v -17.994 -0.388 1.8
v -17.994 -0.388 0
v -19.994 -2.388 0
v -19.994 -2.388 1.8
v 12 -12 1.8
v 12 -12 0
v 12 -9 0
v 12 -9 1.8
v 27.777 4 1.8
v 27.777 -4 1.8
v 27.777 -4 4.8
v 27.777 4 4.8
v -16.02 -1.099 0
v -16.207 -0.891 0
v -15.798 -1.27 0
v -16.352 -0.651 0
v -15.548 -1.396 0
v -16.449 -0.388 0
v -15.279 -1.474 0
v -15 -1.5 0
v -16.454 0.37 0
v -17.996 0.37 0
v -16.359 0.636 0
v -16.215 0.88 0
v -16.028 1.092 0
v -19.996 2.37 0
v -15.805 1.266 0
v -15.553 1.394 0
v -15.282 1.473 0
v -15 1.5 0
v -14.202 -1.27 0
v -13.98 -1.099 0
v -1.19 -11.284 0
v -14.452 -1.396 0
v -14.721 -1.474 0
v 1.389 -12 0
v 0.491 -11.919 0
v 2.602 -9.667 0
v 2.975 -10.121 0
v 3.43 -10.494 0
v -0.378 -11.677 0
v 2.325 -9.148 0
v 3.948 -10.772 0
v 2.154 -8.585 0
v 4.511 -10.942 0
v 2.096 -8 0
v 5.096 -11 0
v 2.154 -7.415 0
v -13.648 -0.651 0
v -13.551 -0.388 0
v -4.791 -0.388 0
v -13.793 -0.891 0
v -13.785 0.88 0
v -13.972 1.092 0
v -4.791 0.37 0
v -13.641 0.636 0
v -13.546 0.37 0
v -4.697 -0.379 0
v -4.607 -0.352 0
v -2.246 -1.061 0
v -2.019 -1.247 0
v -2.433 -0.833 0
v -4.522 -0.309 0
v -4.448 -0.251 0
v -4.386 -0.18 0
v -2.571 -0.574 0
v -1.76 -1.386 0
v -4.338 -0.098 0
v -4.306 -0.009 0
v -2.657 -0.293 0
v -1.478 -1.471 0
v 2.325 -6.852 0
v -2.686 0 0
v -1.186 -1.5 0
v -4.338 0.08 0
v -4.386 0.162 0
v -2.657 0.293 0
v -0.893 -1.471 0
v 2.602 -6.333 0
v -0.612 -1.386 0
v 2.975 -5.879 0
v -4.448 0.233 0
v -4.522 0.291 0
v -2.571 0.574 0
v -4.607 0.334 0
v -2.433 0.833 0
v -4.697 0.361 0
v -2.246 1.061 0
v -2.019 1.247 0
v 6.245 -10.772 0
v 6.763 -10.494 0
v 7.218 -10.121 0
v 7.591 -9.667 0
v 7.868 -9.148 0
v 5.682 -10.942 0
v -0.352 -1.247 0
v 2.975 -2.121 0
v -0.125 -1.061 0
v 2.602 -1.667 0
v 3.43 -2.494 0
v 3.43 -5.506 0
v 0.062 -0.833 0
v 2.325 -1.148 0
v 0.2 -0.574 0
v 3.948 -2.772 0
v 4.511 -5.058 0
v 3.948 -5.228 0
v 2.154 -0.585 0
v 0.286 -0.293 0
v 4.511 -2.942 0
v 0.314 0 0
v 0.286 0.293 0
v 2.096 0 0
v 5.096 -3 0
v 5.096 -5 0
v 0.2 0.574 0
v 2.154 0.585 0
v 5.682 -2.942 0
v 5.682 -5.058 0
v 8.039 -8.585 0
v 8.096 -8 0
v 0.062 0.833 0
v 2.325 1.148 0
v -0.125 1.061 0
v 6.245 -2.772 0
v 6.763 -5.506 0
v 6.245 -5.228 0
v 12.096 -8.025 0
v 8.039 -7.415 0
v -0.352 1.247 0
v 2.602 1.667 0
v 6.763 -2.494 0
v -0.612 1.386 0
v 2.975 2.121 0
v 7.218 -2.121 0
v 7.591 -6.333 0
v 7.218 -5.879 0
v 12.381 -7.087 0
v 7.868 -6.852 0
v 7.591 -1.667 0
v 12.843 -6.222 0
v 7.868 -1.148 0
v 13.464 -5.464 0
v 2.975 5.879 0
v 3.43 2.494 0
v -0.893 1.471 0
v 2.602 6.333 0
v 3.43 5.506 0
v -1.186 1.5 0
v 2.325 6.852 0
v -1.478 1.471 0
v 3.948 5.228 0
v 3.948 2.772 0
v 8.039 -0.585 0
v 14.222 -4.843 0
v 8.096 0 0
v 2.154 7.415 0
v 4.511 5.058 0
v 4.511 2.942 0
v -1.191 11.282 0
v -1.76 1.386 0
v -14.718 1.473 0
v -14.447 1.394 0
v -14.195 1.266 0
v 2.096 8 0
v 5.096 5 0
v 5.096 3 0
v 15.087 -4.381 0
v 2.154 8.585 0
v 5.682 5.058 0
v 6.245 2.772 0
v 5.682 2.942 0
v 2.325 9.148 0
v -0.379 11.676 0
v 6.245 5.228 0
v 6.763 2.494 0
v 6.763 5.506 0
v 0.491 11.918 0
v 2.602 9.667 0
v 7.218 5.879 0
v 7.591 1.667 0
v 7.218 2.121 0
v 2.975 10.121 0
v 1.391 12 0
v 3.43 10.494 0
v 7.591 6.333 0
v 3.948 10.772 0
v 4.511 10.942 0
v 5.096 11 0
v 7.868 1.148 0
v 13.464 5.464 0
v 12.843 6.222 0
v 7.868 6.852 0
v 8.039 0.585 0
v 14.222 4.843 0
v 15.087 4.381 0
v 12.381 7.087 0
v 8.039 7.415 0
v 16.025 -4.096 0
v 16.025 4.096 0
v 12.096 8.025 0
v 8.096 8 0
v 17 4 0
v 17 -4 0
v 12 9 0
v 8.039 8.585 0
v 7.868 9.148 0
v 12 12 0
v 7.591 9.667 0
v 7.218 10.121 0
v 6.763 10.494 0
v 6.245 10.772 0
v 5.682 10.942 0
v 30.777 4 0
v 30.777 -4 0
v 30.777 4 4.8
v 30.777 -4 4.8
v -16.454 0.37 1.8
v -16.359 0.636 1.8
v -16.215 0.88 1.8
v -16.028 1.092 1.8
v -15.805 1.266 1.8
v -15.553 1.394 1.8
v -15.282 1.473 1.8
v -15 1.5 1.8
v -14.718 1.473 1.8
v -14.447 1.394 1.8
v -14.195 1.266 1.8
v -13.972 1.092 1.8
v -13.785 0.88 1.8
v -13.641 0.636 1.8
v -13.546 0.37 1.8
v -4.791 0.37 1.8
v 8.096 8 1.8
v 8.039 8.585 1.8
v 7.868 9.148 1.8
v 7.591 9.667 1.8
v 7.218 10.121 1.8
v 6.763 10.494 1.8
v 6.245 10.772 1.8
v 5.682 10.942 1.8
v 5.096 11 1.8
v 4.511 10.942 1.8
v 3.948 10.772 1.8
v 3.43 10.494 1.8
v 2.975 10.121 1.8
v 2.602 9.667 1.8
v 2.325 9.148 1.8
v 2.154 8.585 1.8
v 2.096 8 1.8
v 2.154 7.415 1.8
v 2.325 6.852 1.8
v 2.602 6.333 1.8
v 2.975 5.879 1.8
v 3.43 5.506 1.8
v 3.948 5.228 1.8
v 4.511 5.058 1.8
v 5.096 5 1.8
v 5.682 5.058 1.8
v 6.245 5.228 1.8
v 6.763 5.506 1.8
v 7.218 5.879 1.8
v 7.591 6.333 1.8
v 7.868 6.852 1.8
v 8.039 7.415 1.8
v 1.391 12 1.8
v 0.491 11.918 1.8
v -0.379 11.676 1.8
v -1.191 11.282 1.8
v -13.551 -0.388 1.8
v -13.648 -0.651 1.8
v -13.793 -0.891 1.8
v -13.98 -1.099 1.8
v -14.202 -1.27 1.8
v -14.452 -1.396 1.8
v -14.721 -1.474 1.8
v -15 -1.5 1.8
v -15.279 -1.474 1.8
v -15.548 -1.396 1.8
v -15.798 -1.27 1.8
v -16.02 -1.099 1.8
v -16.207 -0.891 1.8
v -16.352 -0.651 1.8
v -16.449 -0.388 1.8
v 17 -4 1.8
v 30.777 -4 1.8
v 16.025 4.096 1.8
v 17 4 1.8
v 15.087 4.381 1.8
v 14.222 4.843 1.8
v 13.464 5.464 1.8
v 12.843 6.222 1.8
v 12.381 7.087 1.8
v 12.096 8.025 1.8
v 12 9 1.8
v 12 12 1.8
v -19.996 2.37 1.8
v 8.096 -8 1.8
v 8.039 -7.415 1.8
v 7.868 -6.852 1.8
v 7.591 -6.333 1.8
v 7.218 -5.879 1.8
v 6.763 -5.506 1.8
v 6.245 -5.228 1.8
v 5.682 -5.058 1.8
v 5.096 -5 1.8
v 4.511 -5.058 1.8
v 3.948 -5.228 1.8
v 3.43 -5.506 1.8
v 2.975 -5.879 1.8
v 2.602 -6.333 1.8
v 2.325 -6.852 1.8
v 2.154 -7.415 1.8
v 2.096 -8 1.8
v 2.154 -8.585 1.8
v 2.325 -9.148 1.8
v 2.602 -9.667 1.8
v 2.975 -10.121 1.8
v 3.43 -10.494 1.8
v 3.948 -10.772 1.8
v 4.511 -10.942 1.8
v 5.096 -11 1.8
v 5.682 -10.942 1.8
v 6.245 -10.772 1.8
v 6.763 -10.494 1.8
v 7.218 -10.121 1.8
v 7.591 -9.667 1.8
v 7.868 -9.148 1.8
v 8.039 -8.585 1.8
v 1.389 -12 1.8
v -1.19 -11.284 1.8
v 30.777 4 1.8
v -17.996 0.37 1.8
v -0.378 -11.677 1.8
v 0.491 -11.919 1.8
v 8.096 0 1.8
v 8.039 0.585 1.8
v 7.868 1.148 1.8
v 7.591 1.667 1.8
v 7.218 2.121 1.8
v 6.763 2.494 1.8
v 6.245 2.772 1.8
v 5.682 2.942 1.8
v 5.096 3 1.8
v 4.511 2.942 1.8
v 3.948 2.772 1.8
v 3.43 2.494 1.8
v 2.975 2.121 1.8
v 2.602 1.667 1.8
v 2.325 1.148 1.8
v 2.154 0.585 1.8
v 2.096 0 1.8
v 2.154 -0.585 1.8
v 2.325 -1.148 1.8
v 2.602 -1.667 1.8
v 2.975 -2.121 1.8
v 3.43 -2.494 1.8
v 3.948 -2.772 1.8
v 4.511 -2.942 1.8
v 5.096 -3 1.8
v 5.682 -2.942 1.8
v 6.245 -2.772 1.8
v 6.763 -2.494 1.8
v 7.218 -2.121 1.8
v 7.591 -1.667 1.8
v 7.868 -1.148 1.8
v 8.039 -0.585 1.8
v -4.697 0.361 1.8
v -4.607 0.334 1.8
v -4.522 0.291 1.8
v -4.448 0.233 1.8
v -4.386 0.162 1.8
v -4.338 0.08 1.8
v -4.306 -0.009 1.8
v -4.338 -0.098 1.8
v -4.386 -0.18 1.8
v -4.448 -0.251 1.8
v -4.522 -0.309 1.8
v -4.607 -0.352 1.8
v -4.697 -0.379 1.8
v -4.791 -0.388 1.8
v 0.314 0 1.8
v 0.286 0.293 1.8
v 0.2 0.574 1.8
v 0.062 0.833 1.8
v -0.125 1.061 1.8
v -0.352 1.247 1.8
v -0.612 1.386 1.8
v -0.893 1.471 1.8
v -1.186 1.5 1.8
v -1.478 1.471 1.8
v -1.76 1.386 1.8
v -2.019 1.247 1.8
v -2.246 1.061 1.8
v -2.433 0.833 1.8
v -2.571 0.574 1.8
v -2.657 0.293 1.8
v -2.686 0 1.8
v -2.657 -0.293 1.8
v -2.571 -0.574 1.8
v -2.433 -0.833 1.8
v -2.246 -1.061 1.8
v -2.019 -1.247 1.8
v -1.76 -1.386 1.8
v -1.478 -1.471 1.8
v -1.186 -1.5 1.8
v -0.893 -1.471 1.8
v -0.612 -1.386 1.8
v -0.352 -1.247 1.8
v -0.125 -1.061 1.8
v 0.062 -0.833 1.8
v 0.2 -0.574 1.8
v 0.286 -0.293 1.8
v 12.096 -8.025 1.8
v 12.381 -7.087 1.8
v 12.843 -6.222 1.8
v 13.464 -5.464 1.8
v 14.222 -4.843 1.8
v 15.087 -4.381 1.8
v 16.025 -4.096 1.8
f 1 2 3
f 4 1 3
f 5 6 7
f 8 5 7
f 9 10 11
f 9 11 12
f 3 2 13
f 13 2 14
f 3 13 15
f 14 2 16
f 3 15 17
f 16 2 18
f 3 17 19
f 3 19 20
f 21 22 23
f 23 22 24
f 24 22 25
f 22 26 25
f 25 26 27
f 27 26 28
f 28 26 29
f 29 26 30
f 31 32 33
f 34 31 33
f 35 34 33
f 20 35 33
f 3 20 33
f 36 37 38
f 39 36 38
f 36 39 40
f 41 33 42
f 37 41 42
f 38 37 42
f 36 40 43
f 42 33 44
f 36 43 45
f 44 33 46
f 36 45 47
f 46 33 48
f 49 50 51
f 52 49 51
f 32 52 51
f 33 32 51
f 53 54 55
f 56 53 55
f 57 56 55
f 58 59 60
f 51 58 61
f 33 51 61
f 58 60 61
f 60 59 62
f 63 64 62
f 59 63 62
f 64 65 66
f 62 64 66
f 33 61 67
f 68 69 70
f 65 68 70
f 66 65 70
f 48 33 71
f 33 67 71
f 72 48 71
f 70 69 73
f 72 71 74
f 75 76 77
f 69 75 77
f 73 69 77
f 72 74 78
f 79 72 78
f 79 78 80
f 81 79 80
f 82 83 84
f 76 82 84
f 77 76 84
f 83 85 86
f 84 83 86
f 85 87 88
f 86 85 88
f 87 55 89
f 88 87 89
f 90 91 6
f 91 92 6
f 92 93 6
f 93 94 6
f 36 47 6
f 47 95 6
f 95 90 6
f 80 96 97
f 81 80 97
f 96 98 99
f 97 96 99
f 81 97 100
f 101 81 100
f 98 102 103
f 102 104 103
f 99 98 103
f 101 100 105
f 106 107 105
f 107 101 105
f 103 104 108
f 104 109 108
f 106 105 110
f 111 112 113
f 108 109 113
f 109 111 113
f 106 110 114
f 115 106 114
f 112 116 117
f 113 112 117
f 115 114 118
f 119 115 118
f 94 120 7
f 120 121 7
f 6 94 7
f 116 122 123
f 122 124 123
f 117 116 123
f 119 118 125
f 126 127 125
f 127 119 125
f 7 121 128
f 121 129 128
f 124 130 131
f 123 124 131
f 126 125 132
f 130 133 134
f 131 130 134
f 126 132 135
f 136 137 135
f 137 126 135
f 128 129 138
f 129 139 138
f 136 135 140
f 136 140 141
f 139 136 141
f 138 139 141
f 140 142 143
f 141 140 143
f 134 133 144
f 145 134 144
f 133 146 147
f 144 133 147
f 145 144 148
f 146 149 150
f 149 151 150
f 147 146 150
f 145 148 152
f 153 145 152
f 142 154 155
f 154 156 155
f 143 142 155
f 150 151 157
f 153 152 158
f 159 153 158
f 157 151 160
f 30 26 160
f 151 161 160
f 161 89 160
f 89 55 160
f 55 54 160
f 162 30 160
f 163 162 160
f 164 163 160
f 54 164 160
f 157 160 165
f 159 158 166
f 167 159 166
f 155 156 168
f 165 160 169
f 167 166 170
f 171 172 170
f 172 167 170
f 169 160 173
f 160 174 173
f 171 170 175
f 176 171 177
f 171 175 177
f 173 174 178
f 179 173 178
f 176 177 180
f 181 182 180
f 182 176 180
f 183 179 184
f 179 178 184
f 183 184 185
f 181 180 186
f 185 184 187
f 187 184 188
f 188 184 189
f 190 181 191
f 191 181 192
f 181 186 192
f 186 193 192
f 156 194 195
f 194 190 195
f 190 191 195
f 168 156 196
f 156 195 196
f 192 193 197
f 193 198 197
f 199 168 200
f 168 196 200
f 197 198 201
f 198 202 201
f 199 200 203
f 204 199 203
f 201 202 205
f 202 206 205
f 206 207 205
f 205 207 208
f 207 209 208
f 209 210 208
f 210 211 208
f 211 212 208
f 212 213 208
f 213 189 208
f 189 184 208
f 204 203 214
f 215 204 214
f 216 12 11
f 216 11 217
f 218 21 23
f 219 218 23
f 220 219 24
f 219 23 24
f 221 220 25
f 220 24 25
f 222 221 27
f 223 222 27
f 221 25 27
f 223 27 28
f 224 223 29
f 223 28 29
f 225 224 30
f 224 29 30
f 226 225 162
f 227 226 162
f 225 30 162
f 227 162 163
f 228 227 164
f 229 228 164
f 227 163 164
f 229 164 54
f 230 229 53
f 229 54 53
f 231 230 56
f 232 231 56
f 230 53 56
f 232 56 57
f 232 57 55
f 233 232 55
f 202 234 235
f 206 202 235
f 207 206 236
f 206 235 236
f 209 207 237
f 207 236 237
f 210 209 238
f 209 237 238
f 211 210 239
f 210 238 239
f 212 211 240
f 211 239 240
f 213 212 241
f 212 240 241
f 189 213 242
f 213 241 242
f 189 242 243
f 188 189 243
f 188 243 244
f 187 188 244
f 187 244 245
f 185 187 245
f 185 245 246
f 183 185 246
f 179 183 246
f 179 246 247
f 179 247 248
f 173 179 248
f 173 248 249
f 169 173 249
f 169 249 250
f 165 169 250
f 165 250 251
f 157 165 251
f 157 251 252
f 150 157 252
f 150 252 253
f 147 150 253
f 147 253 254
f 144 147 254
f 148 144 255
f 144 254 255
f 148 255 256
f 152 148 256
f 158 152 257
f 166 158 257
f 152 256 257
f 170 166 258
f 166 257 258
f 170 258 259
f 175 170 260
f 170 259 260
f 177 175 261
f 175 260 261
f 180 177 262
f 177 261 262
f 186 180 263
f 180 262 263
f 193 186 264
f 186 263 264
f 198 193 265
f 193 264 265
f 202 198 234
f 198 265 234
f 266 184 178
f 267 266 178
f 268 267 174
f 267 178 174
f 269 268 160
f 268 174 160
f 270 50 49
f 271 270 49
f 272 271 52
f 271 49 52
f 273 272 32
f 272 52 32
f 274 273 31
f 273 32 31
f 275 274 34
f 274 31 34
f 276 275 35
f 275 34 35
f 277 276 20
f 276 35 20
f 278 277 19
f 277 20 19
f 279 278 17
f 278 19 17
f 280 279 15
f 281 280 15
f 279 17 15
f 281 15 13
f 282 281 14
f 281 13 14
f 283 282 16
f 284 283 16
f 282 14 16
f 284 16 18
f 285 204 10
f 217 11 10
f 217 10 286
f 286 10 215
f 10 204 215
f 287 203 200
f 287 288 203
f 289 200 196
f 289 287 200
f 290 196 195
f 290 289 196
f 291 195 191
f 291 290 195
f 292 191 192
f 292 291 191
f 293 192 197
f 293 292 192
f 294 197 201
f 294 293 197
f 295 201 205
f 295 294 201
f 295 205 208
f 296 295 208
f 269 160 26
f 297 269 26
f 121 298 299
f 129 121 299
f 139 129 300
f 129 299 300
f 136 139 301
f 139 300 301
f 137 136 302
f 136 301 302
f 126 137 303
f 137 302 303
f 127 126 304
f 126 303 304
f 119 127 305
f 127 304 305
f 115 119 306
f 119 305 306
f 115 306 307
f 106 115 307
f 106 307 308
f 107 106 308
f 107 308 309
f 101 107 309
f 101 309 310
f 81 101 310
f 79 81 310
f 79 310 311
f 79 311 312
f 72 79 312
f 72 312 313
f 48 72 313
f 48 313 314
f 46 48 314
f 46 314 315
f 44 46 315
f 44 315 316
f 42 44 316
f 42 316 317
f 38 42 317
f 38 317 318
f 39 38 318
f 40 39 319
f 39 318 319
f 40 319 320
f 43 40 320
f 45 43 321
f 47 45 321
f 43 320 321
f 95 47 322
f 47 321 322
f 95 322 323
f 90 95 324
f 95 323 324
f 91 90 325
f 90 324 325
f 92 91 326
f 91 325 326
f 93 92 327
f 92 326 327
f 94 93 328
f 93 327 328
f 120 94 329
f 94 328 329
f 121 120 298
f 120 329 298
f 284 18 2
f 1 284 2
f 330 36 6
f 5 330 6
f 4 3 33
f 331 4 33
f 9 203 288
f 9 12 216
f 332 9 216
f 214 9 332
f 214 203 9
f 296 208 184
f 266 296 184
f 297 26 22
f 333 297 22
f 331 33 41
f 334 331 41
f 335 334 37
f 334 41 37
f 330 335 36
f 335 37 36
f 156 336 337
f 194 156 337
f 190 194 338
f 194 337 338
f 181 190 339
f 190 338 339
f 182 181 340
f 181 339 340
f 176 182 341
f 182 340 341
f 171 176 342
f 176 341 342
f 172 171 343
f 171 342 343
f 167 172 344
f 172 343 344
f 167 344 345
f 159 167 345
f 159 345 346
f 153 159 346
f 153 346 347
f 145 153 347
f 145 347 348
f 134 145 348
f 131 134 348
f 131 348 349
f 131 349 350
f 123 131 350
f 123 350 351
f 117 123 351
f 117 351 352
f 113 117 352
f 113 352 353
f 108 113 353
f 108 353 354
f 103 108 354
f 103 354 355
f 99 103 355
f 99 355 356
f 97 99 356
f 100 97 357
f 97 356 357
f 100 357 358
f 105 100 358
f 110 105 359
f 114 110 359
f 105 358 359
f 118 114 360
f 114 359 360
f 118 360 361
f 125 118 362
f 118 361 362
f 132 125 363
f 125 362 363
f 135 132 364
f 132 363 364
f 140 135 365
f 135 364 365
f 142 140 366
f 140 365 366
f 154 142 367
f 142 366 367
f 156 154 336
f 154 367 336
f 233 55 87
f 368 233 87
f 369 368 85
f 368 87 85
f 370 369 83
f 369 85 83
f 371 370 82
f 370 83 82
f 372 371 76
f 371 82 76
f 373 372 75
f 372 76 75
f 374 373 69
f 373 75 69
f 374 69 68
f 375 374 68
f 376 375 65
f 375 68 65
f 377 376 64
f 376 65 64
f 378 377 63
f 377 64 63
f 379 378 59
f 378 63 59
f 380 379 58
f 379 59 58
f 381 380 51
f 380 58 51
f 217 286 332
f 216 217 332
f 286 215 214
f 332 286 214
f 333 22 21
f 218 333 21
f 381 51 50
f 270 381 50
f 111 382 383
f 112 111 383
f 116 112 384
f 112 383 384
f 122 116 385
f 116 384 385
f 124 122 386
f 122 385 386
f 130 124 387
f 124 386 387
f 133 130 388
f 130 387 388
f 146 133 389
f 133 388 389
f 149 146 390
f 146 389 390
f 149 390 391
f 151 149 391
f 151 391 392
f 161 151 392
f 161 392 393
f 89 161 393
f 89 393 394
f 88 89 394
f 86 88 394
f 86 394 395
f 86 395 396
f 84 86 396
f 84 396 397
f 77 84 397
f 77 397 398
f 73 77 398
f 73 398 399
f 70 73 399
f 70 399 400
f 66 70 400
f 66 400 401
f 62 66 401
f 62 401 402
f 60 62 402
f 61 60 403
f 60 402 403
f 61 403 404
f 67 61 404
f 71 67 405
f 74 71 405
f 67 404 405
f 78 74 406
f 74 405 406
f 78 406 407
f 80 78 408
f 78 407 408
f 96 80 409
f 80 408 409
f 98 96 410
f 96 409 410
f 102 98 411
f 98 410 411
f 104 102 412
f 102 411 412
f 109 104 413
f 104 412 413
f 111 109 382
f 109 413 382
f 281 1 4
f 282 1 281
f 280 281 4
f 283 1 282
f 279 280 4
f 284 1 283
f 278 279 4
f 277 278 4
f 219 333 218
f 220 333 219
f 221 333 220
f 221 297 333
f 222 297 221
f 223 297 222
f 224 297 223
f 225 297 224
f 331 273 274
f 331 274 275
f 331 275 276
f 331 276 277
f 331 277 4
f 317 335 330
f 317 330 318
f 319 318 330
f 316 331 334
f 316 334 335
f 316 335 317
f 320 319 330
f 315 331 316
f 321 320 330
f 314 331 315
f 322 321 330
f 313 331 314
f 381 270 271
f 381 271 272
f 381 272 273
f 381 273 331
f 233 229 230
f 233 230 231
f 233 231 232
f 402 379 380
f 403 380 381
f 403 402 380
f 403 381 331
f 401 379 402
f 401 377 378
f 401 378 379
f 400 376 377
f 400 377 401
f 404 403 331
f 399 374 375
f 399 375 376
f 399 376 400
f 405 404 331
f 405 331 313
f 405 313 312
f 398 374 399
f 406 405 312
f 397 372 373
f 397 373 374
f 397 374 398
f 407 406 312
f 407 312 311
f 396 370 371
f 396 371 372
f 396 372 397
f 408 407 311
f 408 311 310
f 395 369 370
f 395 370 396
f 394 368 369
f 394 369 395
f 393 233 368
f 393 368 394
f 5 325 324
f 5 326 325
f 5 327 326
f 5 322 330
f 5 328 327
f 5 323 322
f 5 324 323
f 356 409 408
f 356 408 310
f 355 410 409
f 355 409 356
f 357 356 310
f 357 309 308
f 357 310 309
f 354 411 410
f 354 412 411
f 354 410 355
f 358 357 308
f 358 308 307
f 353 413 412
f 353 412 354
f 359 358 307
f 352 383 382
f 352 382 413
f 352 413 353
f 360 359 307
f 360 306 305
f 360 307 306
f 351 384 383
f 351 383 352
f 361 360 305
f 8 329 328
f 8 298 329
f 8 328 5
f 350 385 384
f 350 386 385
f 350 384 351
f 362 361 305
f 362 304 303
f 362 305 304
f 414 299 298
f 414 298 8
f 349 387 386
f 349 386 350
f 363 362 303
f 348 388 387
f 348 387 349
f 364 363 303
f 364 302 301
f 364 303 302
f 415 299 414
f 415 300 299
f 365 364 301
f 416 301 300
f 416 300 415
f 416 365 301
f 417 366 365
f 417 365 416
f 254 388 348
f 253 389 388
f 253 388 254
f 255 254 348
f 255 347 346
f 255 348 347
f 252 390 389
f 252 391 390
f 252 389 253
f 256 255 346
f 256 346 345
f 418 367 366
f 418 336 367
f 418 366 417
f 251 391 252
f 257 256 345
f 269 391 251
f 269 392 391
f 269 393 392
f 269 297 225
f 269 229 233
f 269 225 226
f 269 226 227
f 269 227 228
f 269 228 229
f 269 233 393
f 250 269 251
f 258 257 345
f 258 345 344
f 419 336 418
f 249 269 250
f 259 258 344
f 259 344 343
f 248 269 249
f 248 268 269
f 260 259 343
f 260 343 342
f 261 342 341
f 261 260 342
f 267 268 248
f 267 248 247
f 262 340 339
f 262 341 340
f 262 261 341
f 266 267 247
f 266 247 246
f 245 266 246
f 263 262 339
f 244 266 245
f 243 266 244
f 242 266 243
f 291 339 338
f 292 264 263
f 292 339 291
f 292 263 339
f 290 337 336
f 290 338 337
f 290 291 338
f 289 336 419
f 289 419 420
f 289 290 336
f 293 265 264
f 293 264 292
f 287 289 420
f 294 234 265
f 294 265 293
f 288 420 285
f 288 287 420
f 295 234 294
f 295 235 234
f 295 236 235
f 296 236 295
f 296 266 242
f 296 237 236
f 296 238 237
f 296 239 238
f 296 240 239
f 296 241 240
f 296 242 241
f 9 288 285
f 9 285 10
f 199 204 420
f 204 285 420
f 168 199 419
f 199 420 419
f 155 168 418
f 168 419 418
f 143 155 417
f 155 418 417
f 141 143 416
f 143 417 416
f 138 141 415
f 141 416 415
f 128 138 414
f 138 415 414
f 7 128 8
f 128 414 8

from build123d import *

# Parameters (mm, degrees)
F0_W        = 18.7768550515
F0_H        = 8
F0_W_2      = 1.2231449485
F1_DEPTH    = 1.8
F2_R        = 3
F2_R_2      = 1.5
F3_DEPTH    = 1.801
F4_W        = 3
F4_H        = 8
F5_DEPTH    = 3
F6_R        = 5
F7_T1_DEPTH = 1.8


# Not quite as in the source:
# - a fillet or chamfer that OpenCascade refuses, or shapes differently, is made with other operations: its cross-section is extruded or revolved along the edge and cut away or added


with BuildPart() as f1:
    # F0 (on Top) → F1 (new body)
    with BuildSketch(Plane.XY):
        with BuildLine():
            ThreePointArc((-1.1898192428, -11.2838109608), (0.0506537792, -11.8176267396), (1.3887392017, -12))
            Line((1.3887392017, -12), (12, -12))
            Line((12, -12), (12, -4))
            Line((12, -4), (10.7768550515, -4))
            Line((10.7768550515, -4), (10.7768550515, 4))
            Line((10.7768550515, 4), (12, 4))
            Line((12, 4), (12, 12))
            Line((12, 12), (1.3906232978, 12))
            ThreePointArc((1.3906232978, 12), (0.0508527618, 11.8171583855), (-1.1909314511, 11.2820059643))
            Line((-1.1909314511, 11.2820059643), (-19.9959281202, 2.3695112828))
            Line((-19.9959281202, 2.3695112828), (-17.9959281202, 0.3695112828))
            Line((-17.9959281202, 0.3695112828), (-16.4537748835, 0.3695112828))
            ThreePointArc((-16.4537748835, 0.3695112828), (-15, 1.5), (-13.5462251165, 0.3695112828))
            Line((-13.5462251165, 0.3695112828), (-4.2914064974, 0.3695112828))
            Line((-4.2914064974, 0.3695112828), (-4.2914064974, -0.3879051656))
            Line((-4.2914064974, -0.3879051656), (-13.5510246439, -0.3879051656))
            ThreePointArc((-13.5510246439, -0.3879051656), (-15, -1.5), (-16.4489753561, -0.3879051656))
            Line((-16.4489753561, -0.3879051656), (-17.9941705506, -0.3879051656))
            Line((-17.9941705506, -0.3879051656), (-19.9941705506, -2.3879051656))
            Line((-19.9941705506, -2.3879051656), (-1.1898192428, -11.2838109608))
        make_face()
        with Locations((21.3884275258, 0)):
            Rectangle(F0_W, F0_H)
        with Locations((11.3884275258, 0)):
            Rectangle(F0_W_2, F0_H)
    extrude(amount=F1_DEPTH)

    # F2 (on face) → F3 (cut, through all)
    with BuildSketch(Plane.XY.offset(1.8)):
        with Locations((5.0964765251, 8)):
            Circle(F2_R)
        with Locations((5.0964765251, 0)):
            Circle(F2_R)
        with Locations((5.0964765251, -8)):
            Circle(F2_R)
        with Locations((-1.1856243946, 0)):
            Circle(F2_R_2)
    extrude(amount=-F3_DEPTH, mode=Mode.SUBTRACT)

    # F4 (on face) → F5 (join)
    with BuildSketch(Plane.XY.offset(1.8)):
        with Locations((29.2768550515, 0)):
            Rectangle(F4_W, F4_H)
    extrude(amount=F5_DEPTH)

    # F6
    f6_edges = [f1.edges().sort_by_distance(p)[0] for p in [
        (12, 4, 0.9),
        (12, -4, 0.9),
    ]]
    fillet(f6_edges, radius=F6_R)

    # F7: fillet of radius 0.5 on 2 edges, made by hand

    # F7_s2 → F7_t1 (join)
    with BuildSketch(Plane.XY):
        with BuildLine():
            ThreePointArc((-4.2914064974, 0.1120948344), (-4.4378531068, -0.2414585561), (-4.7914064974, -0.3879051656))
            Line((-4.7914064974, -0.3879051656), (-4.2914064974, -0.3879051656))
            Line((-4.2914064974, -0.3879051656), (-4.2914064974, 0.1120948344))
        make_face()
        with BuildLine():
            ThreePointArc((-4.7914064974, 0.3695112828), (-4.4378531068, 0.2230646734), (-4.2914064974, -0.1304887172))
            Line((-4.2914064974, -0.1304887172), (-4.2914064974, 0.3695112828))
            Line((-4.2914064974, 0.3695112828), (-4.7914064974, 0.3695112828))
        make_face()
    extrude(amount=F7_T1_DEPTH)


solid = f1.part
